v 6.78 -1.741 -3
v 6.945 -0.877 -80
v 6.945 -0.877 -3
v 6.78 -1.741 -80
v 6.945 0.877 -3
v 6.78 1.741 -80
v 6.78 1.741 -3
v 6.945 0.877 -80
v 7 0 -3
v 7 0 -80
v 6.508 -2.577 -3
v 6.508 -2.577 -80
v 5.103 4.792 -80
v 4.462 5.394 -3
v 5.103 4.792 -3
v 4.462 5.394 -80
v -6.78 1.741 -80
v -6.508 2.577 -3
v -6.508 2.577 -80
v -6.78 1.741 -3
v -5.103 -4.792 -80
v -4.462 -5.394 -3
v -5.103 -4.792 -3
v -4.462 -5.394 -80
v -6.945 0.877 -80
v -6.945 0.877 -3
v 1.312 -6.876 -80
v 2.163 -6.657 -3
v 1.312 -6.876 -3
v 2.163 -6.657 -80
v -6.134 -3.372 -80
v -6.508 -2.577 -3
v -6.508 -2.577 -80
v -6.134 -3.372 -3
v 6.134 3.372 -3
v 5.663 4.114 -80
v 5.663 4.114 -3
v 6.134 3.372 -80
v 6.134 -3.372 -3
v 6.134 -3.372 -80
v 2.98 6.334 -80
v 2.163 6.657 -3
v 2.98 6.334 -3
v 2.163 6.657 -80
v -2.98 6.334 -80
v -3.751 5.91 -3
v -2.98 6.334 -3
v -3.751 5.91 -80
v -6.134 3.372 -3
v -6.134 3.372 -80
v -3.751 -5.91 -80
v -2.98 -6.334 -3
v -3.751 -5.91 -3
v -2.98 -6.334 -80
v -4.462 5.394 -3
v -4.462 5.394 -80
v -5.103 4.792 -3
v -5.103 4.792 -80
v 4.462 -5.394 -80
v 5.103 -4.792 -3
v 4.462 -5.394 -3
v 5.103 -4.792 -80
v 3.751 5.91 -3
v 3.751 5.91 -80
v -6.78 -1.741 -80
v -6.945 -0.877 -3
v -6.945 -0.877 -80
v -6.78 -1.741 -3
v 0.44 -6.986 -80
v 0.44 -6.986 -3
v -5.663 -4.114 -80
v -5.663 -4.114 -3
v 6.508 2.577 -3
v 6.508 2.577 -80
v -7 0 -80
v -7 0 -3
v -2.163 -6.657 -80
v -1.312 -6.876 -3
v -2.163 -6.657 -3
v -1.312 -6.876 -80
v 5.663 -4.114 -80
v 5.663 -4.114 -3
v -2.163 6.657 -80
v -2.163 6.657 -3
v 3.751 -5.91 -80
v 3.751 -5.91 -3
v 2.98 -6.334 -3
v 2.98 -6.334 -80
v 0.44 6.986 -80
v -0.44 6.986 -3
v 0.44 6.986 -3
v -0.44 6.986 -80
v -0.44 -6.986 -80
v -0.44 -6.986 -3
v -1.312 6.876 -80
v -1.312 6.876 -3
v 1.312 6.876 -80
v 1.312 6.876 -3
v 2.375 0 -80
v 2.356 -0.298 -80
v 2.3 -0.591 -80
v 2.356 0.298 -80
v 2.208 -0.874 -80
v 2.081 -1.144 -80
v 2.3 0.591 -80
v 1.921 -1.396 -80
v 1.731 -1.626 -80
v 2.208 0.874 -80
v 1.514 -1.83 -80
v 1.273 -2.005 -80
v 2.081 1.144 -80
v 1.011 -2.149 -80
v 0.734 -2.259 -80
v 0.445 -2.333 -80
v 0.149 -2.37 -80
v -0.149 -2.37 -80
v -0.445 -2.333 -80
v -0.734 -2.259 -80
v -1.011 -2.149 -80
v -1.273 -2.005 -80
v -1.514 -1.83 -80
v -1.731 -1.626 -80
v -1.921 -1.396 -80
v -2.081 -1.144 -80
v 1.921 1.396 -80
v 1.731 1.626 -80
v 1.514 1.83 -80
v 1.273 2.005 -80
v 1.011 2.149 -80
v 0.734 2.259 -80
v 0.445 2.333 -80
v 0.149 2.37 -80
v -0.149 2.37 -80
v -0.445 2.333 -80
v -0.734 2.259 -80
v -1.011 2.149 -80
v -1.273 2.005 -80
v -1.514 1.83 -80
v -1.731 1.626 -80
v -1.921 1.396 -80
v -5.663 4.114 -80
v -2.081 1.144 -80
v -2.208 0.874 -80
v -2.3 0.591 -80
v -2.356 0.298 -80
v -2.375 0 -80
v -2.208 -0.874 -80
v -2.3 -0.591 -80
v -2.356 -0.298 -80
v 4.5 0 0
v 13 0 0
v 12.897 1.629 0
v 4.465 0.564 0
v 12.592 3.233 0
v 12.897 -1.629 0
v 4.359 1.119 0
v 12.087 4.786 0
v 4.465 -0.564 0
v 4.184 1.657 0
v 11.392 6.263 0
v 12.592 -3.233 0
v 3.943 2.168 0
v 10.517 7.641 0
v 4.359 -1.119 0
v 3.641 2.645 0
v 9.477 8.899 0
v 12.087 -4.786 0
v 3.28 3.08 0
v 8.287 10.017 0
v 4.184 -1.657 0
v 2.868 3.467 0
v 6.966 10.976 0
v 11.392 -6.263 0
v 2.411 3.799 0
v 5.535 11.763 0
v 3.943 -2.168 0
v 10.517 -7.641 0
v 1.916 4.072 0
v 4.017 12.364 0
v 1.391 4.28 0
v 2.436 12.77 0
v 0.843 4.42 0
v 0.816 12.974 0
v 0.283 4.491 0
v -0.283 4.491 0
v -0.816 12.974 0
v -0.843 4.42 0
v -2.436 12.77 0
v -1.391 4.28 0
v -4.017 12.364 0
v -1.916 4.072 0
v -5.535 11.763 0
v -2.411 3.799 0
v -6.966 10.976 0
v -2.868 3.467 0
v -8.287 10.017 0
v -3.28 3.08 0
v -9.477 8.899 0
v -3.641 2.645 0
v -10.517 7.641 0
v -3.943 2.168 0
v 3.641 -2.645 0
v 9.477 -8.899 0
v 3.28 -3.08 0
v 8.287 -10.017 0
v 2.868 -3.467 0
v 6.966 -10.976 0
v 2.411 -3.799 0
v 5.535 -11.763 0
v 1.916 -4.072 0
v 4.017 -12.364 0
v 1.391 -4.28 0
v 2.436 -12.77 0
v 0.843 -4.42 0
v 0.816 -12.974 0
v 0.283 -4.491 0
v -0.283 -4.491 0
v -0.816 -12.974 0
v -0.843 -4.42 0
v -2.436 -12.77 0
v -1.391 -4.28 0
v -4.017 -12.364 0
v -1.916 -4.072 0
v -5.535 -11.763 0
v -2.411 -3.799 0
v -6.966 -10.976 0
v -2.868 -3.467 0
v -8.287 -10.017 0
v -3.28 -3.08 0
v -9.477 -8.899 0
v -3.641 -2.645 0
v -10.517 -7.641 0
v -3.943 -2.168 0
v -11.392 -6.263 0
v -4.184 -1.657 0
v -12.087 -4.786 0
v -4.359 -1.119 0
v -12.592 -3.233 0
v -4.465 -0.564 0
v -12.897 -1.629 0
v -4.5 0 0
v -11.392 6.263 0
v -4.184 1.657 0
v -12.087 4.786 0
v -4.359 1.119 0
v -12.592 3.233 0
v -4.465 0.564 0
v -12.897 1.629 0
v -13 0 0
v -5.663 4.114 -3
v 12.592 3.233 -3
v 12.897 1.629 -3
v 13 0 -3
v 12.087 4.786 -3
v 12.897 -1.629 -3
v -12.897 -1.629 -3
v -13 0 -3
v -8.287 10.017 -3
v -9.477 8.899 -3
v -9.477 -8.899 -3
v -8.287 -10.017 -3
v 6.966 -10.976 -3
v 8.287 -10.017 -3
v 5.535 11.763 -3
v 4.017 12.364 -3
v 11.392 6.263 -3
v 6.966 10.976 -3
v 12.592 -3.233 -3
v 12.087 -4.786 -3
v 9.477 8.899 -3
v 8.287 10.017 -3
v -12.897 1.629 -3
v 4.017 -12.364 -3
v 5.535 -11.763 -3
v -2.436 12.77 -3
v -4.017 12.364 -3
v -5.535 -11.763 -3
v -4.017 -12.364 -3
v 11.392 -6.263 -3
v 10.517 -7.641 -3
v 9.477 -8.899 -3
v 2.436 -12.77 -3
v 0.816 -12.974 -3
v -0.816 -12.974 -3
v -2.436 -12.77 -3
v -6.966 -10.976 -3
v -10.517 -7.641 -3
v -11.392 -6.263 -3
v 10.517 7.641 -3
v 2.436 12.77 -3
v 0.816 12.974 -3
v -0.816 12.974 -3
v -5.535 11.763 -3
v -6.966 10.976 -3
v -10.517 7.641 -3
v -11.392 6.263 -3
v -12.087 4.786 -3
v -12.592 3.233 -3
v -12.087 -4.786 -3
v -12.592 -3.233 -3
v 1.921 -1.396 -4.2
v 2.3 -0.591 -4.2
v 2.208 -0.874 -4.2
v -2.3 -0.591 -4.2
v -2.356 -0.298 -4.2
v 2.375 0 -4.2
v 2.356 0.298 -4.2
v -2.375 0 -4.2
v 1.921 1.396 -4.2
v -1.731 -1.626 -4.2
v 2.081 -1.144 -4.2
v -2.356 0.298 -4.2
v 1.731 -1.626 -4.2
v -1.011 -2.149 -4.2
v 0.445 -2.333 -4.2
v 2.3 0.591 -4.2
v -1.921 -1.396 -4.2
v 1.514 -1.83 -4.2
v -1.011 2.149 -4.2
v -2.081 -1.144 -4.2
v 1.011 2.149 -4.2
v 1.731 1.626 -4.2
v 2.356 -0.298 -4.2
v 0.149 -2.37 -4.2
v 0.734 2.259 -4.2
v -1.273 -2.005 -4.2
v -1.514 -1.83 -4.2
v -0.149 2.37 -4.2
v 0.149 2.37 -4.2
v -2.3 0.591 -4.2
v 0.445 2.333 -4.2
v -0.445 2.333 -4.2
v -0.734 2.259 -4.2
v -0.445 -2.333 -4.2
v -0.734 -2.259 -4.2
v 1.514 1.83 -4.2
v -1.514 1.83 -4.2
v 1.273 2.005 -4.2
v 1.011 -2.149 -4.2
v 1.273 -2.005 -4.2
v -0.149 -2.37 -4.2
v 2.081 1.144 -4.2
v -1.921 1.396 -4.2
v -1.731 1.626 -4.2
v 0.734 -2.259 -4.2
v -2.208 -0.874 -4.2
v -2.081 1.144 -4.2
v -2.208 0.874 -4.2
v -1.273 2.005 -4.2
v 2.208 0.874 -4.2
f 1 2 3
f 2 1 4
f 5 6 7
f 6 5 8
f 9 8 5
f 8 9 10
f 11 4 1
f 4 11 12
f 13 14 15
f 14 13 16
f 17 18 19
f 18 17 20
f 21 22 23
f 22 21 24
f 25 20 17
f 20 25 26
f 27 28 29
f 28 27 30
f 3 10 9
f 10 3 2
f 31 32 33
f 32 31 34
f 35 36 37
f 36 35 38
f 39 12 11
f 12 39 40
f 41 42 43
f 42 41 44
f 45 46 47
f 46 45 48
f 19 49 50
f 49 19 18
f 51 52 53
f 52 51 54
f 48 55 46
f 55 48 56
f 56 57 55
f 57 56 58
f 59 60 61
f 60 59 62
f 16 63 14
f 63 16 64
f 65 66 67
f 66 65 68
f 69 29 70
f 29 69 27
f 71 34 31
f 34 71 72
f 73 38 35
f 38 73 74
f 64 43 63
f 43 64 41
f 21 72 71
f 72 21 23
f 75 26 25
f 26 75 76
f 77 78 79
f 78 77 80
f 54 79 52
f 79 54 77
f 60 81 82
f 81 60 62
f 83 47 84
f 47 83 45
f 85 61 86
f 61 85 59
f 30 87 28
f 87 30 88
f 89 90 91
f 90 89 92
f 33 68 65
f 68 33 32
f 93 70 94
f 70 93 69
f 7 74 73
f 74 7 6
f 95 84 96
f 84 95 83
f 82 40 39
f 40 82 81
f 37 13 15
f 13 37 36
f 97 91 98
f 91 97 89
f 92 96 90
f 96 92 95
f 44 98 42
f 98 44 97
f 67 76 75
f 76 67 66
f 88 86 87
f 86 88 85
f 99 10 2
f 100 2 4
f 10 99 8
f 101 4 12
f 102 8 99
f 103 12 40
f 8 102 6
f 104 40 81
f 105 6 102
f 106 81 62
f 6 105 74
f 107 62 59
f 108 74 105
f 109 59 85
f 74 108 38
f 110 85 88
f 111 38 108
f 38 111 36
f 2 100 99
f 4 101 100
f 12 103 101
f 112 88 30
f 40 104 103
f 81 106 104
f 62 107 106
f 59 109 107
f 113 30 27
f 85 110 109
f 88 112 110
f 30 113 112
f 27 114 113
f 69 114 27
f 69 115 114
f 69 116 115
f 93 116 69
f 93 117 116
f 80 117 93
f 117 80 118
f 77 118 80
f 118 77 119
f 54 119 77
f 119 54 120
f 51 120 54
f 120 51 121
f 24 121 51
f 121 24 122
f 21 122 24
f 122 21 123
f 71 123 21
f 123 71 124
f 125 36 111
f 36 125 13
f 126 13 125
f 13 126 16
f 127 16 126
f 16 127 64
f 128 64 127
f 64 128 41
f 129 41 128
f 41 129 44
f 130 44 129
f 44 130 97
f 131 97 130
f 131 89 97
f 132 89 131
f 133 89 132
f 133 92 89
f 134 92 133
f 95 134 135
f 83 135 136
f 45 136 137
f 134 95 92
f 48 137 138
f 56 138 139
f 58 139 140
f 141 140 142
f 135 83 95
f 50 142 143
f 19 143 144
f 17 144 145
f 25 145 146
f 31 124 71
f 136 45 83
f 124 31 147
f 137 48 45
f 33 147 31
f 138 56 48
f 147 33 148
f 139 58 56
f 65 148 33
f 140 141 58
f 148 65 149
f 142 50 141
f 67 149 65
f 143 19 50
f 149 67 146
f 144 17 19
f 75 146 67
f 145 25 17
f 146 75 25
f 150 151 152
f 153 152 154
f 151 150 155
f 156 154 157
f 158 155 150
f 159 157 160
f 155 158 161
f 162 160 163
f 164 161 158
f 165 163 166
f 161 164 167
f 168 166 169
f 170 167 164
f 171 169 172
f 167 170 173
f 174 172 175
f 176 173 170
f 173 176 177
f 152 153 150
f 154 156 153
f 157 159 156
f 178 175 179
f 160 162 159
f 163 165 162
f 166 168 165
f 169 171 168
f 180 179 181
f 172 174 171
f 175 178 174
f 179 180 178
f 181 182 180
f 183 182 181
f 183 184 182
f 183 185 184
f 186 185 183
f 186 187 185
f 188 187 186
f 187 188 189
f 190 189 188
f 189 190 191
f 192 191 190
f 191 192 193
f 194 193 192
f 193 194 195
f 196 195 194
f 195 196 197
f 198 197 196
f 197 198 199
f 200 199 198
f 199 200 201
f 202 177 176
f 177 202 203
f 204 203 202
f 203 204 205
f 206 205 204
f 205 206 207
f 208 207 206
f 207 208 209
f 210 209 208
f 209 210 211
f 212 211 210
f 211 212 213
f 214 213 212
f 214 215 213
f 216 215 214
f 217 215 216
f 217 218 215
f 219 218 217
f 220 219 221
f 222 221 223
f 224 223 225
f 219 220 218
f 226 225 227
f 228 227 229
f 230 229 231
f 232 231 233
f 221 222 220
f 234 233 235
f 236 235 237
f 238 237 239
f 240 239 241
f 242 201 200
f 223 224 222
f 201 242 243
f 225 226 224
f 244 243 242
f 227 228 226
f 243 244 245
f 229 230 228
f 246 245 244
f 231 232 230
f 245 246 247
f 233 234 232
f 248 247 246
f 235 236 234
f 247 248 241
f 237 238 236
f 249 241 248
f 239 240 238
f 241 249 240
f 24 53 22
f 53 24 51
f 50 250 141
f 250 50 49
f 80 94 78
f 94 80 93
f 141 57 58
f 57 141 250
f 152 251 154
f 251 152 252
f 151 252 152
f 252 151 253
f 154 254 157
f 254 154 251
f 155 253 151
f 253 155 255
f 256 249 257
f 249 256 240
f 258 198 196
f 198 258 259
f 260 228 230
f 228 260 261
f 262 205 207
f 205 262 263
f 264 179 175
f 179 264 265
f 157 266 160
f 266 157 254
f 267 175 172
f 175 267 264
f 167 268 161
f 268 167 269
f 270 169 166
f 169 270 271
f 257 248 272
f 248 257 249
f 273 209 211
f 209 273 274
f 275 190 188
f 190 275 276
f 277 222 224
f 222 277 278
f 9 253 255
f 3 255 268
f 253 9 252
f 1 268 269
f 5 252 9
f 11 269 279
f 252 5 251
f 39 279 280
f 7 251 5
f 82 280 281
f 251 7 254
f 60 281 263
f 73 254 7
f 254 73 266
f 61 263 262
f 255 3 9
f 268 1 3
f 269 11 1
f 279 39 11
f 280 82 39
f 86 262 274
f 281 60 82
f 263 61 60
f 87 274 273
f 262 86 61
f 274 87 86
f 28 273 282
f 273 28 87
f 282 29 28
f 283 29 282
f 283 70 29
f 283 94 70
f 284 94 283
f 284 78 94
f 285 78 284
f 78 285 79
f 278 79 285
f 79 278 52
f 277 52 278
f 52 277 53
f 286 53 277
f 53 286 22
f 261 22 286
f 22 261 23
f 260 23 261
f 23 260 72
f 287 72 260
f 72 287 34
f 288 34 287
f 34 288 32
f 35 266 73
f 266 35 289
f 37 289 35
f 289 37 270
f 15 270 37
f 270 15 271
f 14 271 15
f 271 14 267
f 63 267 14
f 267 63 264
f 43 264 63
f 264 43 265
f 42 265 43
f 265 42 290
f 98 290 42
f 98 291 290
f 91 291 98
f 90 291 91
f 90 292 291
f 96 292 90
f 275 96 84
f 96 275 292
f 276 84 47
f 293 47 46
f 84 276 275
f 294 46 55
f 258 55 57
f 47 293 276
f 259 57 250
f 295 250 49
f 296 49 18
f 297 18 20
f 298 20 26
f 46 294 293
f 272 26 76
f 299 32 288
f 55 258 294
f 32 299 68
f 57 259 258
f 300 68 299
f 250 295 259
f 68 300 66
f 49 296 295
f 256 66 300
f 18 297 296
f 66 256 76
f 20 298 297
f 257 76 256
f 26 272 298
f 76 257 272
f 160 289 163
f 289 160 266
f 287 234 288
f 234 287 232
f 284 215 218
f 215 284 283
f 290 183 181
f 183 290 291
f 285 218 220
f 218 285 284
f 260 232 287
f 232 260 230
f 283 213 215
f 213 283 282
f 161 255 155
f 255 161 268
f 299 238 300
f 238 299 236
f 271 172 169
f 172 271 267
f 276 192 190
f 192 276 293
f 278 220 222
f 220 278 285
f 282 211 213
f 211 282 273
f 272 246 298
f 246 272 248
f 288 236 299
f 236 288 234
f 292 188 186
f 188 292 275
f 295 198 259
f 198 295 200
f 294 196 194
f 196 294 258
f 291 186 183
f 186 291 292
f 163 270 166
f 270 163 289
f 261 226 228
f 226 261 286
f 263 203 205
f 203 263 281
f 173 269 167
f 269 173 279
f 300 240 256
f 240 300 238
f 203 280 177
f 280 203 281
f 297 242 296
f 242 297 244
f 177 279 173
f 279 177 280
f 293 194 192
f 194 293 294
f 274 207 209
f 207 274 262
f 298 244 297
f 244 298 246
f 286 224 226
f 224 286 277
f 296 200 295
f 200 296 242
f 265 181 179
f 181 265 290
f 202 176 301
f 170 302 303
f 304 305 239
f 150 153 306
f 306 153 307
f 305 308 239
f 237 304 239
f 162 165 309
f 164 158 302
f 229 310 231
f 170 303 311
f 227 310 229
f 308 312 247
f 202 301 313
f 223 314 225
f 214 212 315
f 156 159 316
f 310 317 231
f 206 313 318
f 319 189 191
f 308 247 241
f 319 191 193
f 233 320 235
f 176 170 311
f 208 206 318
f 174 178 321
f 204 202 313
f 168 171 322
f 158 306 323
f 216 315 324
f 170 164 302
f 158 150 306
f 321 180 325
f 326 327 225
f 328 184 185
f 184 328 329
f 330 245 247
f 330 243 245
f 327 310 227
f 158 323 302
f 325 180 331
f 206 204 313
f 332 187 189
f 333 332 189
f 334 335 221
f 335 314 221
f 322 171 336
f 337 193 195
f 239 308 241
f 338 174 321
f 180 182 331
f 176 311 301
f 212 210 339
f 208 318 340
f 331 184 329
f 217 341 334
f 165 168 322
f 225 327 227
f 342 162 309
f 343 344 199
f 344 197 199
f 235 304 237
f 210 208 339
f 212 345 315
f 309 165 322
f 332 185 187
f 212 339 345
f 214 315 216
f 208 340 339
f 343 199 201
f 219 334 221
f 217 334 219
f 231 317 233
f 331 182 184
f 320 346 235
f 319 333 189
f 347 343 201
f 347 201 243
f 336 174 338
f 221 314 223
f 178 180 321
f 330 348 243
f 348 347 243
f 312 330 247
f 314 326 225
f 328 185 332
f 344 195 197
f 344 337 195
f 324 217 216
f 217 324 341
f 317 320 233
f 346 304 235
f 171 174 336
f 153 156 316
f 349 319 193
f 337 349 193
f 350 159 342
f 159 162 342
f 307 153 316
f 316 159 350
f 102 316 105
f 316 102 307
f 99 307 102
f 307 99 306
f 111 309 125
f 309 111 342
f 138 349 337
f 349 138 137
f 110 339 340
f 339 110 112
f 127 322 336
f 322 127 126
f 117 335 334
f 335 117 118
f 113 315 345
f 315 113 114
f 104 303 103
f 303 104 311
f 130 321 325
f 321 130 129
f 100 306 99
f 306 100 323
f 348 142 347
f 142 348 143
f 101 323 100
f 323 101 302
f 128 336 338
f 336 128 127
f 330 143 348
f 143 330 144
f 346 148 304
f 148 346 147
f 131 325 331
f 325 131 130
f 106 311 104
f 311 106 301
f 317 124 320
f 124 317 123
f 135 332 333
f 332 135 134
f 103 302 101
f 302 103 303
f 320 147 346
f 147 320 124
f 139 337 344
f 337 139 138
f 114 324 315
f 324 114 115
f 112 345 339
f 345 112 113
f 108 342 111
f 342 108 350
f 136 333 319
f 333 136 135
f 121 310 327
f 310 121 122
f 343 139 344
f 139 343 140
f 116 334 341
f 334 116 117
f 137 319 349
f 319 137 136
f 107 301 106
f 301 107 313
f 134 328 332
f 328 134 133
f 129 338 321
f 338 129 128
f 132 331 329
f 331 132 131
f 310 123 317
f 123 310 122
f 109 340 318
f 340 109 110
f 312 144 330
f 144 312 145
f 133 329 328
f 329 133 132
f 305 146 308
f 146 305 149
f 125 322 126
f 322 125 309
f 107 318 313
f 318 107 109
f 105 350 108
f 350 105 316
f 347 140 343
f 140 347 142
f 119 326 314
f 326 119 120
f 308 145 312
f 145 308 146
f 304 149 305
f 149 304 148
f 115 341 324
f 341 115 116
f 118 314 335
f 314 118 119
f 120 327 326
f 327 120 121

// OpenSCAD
$fn = 50;


difference() {
	union() {
		translate(v = [0, 0, -80.0000000000]) {
			cylinder(h = 80, r = 7.0000000000);
		}
		translate(v = [0, 0, -3.0000000000]) {
			cylinder(h = 3, r = 13.0000000000);
		}
	}
	union() {
		translate(v = [0, 0, 0]) {
			rotate(a = [0, 0, 0]) {
				difference() {
					union() {
						#translate(v = [0, 0, -80.0000000000]) {
							cylinder(h = 80, r = 2.2500000000);
						}
						#translate(v = [0, 0, -4.2000000000]) {
							cylinder(h = 4.2000000000, r1 = 2.3750000000, r2 = 4.5000000000);
						}
						#translate(v = [0, 0, -80.0000000000]) {
							cylinder(h = 80, r = 2.3750000000);
						}
						#translate(v = [0, 0, -80.0000000000]) {
							cylinder(h = 80, r = 2.2500000000);
						}
					}
					union();
				}
			}
		}
	}
}
